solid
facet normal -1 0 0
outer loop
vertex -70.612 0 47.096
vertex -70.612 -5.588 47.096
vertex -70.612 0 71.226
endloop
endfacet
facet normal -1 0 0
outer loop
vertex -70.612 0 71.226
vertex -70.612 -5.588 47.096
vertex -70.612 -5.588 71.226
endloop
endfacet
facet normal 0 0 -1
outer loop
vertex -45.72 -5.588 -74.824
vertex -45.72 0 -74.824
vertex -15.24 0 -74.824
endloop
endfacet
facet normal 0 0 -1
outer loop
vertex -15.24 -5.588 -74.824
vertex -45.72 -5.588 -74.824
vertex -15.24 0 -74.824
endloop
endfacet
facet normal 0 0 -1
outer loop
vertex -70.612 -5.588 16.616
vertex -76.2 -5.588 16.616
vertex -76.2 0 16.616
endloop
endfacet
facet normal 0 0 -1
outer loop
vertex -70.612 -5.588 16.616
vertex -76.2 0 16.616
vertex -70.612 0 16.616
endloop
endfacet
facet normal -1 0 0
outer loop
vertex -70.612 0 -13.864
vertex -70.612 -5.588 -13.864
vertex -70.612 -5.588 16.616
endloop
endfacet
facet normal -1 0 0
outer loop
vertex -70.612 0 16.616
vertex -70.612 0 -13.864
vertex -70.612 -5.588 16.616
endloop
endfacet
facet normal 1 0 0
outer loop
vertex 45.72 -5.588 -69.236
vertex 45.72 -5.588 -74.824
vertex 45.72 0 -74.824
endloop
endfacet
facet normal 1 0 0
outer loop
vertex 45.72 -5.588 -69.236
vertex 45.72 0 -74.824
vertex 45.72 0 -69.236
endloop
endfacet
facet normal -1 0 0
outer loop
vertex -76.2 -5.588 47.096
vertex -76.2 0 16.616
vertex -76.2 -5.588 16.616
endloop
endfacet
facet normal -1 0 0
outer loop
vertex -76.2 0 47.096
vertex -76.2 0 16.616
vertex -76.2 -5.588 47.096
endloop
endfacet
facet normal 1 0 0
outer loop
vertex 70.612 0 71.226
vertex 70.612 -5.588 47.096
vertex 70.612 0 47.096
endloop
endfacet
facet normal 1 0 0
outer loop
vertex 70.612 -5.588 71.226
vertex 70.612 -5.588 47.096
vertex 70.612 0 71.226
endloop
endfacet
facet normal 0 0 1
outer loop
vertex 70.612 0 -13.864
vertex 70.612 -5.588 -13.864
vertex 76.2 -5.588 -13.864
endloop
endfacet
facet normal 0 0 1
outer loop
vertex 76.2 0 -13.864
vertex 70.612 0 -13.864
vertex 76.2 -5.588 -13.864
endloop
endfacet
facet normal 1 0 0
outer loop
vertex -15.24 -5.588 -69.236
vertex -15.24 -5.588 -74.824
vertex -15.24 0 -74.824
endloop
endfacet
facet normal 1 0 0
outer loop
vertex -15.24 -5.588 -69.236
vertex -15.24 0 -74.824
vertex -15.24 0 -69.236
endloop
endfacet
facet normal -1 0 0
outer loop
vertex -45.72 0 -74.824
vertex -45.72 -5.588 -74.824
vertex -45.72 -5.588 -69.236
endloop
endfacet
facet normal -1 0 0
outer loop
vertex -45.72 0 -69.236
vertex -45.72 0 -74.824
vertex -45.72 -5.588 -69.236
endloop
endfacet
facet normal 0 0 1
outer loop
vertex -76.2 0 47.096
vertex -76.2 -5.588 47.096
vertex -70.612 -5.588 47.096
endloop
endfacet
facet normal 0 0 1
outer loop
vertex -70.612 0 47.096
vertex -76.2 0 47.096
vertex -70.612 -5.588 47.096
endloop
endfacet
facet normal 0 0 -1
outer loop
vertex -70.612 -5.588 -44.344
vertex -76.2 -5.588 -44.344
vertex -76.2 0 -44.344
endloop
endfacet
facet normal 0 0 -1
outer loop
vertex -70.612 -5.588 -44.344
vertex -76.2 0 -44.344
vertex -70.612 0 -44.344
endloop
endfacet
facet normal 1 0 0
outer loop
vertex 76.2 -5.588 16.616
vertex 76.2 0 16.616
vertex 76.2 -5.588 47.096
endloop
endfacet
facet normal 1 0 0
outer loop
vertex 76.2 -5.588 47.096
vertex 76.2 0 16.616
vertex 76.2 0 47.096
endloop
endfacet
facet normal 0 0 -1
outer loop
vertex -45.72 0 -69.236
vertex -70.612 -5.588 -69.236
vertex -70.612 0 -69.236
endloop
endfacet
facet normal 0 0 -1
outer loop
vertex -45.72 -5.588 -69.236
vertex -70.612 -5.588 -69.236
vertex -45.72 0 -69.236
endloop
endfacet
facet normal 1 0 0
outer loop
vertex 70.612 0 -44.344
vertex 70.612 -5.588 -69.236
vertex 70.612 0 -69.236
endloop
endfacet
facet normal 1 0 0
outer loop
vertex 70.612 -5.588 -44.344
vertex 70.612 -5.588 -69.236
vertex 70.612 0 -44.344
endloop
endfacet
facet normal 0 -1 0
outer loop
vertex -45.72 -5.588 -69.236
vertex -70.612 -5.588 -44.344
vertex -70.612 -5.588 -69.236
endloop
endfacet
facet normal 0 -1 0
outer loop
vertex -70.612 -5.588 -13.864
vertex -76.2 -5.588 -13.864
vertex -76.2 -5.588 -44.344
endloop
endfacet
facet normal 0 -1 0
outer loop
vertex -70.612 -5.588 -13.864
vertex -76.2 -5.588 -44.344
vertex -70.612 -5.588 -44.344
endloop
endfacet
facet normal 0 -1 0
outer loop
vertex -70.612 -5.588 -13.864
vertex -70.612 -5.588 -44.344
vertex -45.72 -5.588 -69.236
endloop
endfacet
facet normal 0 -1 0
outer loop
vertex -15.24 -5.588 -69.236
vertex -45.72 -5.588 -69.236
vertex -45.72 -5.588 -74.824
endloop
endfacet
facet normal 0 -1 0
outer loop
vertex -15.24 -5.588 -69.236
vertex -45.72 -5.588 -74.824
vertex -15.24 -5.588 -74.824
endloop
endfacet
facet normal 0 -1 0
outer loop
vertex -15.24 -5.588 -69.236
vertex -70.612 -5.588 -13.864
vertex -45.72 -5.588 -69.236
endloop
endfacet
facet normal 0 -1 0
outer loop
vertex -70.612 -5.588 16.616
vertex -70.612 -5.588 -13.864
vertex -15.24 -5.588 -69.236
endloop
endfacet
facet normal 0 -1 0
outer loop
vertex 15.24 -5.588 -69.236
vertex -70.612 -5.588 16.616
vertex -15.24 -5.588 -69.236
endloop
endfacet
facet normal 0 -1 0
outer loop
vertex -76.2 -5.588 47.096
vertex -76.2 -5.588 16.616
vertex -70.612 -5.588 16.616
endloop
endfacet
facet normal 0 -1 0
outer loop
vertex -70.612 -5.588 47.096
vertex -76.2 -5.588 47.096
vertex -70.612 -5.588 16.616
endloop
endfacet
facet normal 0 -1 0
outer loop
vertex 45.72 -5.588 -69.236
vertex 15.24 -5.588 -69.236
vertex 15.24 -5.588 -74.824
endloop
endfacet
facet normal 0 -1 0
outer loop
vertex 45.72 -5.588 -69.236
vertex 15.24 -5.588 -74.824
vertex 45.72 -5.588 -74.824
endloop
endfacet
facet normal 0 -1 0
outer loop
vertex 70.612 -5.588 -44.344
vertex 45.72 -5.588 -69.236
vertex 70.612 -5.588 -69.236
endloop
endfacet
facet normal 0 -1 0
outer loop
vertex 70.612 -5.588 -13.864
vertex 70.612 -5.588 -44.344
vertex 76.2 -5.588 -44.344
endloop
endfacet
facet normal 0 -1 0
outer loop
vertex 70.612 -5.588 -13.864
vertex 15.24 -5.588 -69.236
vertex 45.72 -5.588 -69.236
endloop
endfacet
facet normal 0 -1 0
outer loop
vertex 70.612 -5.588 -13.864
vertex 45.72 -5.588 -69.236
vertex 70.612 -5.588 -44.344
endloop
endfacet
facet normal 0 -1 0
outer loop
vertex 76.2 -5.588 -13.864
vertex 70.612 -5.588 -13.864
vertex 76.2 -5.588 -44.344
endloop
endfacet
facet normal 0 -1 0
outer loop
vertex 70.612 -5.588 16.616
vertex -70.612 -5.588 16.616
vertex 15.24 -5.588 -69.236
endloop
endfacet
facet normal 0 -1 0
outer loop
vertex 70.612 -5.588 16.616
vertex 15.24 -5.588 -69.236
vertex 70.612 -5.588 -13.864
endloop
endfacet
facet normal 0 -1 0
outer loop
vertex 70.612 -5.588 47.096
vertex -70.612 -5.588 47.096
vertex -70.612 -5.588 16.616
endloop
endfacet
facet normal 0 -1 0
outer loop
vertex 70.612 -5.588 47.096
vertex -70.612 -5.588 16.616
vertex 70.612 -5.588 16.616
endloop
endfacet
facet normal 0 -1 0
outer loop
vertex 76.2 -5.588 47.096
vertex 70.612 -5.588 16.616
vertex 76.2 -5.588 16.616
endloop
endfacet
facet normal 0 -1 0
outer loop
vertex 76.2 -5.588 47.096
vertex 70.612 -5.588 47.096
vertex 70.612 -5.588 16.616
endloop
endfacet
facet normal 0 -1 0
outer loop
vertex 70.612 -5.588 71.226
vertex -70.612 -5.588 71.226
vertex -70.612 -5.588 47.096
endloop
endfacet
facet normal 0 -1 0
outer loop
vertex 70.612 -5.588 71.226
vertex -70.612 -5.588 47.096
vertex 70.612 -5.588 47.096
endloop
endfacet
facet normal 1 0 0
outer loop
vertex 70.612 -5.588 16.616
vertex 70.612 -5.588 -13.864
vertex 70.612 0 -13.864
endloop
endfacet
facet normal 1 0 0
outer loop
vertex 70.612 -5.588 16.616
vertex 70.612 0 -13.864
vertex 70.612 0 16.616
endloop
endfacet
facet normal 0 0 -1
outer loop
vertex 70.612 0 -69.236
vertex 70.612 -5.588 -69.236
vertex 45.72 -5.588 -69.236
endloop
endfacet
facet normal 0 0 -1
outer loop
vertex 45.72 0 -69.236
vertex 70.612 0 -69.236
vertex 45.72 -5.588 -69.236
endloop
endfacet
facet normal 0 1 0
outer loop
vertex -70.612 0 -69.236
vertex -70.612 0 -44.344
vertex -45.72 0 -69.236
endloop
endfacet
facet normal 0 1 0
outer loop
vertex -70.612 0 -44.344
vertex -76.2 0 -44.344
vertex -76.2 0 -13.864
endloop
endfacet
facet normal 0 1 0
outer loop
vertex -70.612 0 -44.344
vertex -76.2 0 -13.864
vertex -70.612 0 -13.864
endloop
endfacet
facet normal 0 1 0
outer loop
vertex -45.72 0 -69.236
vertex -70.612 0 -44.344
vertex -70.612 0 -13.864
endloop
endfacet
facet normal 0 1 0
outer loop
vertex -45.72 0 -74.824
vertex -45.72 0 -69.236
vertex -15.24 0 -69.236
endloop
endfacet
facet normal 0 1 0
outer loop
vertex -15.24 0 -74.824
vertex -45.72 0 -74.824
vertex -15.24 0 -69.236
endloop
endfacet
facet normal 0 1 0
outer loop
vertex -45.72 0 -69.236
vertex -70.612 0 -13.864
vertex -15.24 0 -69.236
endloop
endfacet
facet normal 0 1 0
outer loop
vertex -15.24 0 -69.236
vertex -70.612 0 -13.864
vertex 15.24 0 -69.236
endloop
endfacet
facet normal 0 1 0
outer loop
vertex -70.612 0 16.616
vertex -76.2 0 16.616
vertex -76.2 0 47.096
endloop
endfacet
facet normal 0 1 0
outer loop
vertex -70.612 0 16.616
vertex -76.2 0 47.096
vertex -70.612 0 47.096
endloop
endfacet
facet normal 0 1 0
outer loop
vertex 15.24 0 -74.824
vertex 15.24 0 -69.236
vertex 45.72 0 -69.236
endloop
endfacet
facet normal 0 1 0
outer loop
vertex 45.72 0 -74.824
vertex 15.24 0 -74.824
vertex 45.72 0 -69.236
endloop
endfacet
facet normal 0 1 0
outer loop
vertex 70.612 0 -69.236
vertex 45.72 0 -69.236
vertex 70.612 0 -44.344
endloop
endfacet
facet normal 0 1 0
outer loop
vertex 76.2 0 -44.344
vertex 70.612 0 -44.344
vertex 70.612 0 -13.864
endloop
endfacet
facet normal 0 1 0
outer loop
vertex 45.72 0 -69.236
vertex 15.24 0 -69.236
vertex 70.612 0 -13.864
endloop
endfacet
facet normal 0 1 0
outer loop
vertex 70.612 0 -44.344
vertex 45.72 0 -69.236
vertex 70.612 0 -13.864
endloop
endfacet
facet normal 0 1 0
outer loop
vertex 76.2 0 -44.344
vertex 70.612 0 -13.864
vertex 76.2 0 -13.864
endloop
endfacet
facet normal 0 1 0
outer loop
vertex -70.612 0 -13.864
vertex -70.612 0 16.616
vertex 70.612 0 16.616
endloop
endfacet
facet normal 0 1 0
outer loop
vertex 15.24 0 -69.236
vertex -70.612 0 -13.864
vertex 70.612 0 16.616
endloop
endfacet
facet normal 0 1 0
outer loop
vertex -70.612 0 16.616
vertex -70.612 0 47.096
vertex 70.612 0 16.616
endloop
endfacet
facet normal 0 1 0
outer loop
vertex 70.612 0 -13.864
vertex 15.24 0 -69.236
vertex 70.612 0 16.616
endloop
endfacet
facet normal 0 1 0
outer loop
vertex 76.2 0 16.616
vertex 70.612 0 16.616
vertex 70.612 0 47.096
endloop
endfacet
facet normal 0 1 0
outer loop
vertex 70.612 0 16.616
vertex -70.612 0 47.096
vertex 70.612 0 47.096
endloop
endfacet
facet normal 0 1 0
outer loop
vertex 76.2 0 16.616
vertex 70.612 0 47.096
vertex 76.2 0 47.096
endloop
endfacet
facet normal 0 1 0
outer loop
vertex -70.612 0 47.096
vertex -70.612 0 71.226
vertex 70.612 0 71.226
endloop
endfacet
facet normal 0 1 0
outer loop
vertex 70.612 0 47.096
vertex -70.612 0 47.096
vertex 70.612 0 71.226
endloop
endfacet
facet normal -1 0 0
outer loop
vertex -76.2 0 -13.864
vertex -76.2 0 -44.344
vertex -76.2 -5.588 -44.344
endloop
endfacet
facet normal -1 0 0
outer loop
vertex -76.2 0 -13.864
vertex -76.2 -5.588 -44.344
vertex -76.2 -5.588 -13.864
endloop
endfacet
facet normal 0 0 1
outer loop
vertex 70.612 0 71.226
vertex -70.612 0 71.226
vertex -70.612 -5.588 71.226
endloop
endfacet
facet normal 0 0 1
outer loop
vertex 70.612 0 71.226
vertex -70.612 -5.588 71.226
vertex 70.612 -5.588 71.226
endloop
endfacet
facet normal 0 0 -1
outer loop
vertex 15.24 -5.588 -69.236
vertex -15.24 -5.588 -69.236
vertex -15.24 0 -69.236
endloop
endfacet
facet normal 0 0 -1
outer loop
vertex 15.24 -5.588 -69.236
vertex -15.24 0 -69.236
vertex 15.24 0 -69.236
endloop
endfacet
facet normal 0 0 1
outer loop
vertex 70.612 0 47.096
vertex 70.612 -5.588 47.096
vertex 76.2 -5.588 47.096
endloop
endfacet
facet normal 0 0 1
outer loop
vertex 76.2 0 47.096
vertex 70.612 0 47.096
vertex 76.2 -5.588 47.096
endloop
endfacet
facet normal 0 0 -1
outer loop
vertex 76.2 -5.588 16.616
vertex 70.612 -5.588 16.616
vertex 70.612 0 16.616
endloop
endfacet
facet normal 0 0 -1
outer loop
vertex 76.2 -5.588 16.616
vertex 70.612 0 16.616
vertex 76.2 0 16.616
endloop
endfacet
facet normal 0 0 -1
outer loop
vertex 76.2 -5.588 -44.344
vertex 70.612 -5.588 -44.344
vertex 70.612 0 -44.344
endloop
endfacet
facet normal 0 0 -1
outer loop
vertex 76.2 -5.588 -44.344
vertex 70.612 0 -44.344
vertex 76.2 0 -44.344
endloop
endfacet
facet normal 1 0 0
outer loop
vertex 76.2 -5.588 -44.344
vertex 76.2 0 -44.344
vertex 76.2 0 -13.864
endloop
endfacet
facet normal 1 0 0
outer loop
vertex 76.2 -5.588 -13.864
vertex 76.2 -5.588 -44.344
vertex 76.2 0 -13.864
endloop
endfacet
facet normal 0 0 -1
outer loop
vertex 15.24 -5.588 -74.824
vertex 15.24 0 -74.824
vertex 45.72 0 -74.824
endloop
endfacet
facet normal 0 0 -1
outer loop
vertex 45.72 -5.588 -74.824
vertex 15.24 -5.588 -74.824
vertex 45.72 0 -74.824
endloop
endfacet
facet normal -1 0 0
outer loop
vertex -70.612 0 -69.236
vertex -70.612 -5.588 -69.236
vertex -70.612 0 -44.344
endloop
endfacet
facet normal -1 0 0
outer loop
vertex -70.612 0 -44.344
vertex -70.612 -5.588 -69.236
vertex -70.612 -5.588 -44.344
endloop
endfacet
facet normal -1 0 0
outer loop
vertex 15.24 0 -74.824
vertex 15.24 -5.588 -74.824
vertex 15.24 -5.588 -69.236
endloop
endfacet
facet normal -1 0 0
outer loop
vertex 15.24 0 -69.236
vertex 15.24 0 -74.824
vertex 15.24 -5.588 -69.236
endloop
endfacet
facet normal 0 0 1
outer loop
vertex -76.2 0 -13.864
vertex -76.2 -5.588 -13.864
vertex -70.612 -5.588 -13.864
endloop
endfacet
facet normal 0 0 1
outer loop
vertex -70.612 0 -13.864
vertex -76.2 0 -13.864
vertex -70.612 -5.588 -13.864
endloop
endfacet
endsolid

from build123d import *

# Parameters (mm, degrees)
F0_W     = 152.4
F0_H     = 146.05
F1_DEPTH = 5.588
F2_W     = 5.588
F2_H     = 24.13
F2_H_2   = 30.48
F2_H_3   = 24.892
F2_W_2   = 24.892
F2_H_4   = 5.588
F2_W_3   = 30.48
F3_DEPTH = 5.589


with BuildPart() as f1:
    # F0 (on Front) → F1 (new body)
    with BuildSketch(Plane.XZ):
        with Locations((0, -1.799165)):
            Rectangle(F0_W, F0_H)
    extrude(amount=F1_DEPTH)

    # F2 (on face) → F3 (cut, through all)
    with BuildSketch(Plane.XZ.offset(5.588)):
        with Locations((-73.406, 59.160835)):
            Rectangle(F2_W, F2_H)
        with Locations((-73.406, 1.375835)):
            Rectangle(F2_W, F2_H_2)
        with Locations((-73.406, -56.790165)):
            Rectangle(F2_W, F2_H_3)
        with Locations((-58.166, -72.030165)):
            Rectangle(F2_W_2, F2_H_4)
        with Locations((-73.406, -72.030165)):
            Rectangle(F2_W, F2_H_4)
        with Locations((0, -72.030165)):
            Rectangle(F2_W_3, F2_H_4)
        with Locations((58.166, -72.030165)):
            Rectangle(F2_W_2, F2_H_4)
        with Locations((73.406, -72.030165)):
            Rectangle(F2_W, F2_H_4)
        with Locations((73.406, -56.790165)):
            Rectangle(F2_W, F2_H_3)
        with Locations((73.406, 1.375835)):
            Rectangle(F2_W, F2_H_2)
        with Locations((73.406, 59.160835)):
            Rectangle(F2_W, F2_H)
    extrude(amount=-F3_DEPTH, mode=Mode.SUBTRACT)


solid = f1.part
